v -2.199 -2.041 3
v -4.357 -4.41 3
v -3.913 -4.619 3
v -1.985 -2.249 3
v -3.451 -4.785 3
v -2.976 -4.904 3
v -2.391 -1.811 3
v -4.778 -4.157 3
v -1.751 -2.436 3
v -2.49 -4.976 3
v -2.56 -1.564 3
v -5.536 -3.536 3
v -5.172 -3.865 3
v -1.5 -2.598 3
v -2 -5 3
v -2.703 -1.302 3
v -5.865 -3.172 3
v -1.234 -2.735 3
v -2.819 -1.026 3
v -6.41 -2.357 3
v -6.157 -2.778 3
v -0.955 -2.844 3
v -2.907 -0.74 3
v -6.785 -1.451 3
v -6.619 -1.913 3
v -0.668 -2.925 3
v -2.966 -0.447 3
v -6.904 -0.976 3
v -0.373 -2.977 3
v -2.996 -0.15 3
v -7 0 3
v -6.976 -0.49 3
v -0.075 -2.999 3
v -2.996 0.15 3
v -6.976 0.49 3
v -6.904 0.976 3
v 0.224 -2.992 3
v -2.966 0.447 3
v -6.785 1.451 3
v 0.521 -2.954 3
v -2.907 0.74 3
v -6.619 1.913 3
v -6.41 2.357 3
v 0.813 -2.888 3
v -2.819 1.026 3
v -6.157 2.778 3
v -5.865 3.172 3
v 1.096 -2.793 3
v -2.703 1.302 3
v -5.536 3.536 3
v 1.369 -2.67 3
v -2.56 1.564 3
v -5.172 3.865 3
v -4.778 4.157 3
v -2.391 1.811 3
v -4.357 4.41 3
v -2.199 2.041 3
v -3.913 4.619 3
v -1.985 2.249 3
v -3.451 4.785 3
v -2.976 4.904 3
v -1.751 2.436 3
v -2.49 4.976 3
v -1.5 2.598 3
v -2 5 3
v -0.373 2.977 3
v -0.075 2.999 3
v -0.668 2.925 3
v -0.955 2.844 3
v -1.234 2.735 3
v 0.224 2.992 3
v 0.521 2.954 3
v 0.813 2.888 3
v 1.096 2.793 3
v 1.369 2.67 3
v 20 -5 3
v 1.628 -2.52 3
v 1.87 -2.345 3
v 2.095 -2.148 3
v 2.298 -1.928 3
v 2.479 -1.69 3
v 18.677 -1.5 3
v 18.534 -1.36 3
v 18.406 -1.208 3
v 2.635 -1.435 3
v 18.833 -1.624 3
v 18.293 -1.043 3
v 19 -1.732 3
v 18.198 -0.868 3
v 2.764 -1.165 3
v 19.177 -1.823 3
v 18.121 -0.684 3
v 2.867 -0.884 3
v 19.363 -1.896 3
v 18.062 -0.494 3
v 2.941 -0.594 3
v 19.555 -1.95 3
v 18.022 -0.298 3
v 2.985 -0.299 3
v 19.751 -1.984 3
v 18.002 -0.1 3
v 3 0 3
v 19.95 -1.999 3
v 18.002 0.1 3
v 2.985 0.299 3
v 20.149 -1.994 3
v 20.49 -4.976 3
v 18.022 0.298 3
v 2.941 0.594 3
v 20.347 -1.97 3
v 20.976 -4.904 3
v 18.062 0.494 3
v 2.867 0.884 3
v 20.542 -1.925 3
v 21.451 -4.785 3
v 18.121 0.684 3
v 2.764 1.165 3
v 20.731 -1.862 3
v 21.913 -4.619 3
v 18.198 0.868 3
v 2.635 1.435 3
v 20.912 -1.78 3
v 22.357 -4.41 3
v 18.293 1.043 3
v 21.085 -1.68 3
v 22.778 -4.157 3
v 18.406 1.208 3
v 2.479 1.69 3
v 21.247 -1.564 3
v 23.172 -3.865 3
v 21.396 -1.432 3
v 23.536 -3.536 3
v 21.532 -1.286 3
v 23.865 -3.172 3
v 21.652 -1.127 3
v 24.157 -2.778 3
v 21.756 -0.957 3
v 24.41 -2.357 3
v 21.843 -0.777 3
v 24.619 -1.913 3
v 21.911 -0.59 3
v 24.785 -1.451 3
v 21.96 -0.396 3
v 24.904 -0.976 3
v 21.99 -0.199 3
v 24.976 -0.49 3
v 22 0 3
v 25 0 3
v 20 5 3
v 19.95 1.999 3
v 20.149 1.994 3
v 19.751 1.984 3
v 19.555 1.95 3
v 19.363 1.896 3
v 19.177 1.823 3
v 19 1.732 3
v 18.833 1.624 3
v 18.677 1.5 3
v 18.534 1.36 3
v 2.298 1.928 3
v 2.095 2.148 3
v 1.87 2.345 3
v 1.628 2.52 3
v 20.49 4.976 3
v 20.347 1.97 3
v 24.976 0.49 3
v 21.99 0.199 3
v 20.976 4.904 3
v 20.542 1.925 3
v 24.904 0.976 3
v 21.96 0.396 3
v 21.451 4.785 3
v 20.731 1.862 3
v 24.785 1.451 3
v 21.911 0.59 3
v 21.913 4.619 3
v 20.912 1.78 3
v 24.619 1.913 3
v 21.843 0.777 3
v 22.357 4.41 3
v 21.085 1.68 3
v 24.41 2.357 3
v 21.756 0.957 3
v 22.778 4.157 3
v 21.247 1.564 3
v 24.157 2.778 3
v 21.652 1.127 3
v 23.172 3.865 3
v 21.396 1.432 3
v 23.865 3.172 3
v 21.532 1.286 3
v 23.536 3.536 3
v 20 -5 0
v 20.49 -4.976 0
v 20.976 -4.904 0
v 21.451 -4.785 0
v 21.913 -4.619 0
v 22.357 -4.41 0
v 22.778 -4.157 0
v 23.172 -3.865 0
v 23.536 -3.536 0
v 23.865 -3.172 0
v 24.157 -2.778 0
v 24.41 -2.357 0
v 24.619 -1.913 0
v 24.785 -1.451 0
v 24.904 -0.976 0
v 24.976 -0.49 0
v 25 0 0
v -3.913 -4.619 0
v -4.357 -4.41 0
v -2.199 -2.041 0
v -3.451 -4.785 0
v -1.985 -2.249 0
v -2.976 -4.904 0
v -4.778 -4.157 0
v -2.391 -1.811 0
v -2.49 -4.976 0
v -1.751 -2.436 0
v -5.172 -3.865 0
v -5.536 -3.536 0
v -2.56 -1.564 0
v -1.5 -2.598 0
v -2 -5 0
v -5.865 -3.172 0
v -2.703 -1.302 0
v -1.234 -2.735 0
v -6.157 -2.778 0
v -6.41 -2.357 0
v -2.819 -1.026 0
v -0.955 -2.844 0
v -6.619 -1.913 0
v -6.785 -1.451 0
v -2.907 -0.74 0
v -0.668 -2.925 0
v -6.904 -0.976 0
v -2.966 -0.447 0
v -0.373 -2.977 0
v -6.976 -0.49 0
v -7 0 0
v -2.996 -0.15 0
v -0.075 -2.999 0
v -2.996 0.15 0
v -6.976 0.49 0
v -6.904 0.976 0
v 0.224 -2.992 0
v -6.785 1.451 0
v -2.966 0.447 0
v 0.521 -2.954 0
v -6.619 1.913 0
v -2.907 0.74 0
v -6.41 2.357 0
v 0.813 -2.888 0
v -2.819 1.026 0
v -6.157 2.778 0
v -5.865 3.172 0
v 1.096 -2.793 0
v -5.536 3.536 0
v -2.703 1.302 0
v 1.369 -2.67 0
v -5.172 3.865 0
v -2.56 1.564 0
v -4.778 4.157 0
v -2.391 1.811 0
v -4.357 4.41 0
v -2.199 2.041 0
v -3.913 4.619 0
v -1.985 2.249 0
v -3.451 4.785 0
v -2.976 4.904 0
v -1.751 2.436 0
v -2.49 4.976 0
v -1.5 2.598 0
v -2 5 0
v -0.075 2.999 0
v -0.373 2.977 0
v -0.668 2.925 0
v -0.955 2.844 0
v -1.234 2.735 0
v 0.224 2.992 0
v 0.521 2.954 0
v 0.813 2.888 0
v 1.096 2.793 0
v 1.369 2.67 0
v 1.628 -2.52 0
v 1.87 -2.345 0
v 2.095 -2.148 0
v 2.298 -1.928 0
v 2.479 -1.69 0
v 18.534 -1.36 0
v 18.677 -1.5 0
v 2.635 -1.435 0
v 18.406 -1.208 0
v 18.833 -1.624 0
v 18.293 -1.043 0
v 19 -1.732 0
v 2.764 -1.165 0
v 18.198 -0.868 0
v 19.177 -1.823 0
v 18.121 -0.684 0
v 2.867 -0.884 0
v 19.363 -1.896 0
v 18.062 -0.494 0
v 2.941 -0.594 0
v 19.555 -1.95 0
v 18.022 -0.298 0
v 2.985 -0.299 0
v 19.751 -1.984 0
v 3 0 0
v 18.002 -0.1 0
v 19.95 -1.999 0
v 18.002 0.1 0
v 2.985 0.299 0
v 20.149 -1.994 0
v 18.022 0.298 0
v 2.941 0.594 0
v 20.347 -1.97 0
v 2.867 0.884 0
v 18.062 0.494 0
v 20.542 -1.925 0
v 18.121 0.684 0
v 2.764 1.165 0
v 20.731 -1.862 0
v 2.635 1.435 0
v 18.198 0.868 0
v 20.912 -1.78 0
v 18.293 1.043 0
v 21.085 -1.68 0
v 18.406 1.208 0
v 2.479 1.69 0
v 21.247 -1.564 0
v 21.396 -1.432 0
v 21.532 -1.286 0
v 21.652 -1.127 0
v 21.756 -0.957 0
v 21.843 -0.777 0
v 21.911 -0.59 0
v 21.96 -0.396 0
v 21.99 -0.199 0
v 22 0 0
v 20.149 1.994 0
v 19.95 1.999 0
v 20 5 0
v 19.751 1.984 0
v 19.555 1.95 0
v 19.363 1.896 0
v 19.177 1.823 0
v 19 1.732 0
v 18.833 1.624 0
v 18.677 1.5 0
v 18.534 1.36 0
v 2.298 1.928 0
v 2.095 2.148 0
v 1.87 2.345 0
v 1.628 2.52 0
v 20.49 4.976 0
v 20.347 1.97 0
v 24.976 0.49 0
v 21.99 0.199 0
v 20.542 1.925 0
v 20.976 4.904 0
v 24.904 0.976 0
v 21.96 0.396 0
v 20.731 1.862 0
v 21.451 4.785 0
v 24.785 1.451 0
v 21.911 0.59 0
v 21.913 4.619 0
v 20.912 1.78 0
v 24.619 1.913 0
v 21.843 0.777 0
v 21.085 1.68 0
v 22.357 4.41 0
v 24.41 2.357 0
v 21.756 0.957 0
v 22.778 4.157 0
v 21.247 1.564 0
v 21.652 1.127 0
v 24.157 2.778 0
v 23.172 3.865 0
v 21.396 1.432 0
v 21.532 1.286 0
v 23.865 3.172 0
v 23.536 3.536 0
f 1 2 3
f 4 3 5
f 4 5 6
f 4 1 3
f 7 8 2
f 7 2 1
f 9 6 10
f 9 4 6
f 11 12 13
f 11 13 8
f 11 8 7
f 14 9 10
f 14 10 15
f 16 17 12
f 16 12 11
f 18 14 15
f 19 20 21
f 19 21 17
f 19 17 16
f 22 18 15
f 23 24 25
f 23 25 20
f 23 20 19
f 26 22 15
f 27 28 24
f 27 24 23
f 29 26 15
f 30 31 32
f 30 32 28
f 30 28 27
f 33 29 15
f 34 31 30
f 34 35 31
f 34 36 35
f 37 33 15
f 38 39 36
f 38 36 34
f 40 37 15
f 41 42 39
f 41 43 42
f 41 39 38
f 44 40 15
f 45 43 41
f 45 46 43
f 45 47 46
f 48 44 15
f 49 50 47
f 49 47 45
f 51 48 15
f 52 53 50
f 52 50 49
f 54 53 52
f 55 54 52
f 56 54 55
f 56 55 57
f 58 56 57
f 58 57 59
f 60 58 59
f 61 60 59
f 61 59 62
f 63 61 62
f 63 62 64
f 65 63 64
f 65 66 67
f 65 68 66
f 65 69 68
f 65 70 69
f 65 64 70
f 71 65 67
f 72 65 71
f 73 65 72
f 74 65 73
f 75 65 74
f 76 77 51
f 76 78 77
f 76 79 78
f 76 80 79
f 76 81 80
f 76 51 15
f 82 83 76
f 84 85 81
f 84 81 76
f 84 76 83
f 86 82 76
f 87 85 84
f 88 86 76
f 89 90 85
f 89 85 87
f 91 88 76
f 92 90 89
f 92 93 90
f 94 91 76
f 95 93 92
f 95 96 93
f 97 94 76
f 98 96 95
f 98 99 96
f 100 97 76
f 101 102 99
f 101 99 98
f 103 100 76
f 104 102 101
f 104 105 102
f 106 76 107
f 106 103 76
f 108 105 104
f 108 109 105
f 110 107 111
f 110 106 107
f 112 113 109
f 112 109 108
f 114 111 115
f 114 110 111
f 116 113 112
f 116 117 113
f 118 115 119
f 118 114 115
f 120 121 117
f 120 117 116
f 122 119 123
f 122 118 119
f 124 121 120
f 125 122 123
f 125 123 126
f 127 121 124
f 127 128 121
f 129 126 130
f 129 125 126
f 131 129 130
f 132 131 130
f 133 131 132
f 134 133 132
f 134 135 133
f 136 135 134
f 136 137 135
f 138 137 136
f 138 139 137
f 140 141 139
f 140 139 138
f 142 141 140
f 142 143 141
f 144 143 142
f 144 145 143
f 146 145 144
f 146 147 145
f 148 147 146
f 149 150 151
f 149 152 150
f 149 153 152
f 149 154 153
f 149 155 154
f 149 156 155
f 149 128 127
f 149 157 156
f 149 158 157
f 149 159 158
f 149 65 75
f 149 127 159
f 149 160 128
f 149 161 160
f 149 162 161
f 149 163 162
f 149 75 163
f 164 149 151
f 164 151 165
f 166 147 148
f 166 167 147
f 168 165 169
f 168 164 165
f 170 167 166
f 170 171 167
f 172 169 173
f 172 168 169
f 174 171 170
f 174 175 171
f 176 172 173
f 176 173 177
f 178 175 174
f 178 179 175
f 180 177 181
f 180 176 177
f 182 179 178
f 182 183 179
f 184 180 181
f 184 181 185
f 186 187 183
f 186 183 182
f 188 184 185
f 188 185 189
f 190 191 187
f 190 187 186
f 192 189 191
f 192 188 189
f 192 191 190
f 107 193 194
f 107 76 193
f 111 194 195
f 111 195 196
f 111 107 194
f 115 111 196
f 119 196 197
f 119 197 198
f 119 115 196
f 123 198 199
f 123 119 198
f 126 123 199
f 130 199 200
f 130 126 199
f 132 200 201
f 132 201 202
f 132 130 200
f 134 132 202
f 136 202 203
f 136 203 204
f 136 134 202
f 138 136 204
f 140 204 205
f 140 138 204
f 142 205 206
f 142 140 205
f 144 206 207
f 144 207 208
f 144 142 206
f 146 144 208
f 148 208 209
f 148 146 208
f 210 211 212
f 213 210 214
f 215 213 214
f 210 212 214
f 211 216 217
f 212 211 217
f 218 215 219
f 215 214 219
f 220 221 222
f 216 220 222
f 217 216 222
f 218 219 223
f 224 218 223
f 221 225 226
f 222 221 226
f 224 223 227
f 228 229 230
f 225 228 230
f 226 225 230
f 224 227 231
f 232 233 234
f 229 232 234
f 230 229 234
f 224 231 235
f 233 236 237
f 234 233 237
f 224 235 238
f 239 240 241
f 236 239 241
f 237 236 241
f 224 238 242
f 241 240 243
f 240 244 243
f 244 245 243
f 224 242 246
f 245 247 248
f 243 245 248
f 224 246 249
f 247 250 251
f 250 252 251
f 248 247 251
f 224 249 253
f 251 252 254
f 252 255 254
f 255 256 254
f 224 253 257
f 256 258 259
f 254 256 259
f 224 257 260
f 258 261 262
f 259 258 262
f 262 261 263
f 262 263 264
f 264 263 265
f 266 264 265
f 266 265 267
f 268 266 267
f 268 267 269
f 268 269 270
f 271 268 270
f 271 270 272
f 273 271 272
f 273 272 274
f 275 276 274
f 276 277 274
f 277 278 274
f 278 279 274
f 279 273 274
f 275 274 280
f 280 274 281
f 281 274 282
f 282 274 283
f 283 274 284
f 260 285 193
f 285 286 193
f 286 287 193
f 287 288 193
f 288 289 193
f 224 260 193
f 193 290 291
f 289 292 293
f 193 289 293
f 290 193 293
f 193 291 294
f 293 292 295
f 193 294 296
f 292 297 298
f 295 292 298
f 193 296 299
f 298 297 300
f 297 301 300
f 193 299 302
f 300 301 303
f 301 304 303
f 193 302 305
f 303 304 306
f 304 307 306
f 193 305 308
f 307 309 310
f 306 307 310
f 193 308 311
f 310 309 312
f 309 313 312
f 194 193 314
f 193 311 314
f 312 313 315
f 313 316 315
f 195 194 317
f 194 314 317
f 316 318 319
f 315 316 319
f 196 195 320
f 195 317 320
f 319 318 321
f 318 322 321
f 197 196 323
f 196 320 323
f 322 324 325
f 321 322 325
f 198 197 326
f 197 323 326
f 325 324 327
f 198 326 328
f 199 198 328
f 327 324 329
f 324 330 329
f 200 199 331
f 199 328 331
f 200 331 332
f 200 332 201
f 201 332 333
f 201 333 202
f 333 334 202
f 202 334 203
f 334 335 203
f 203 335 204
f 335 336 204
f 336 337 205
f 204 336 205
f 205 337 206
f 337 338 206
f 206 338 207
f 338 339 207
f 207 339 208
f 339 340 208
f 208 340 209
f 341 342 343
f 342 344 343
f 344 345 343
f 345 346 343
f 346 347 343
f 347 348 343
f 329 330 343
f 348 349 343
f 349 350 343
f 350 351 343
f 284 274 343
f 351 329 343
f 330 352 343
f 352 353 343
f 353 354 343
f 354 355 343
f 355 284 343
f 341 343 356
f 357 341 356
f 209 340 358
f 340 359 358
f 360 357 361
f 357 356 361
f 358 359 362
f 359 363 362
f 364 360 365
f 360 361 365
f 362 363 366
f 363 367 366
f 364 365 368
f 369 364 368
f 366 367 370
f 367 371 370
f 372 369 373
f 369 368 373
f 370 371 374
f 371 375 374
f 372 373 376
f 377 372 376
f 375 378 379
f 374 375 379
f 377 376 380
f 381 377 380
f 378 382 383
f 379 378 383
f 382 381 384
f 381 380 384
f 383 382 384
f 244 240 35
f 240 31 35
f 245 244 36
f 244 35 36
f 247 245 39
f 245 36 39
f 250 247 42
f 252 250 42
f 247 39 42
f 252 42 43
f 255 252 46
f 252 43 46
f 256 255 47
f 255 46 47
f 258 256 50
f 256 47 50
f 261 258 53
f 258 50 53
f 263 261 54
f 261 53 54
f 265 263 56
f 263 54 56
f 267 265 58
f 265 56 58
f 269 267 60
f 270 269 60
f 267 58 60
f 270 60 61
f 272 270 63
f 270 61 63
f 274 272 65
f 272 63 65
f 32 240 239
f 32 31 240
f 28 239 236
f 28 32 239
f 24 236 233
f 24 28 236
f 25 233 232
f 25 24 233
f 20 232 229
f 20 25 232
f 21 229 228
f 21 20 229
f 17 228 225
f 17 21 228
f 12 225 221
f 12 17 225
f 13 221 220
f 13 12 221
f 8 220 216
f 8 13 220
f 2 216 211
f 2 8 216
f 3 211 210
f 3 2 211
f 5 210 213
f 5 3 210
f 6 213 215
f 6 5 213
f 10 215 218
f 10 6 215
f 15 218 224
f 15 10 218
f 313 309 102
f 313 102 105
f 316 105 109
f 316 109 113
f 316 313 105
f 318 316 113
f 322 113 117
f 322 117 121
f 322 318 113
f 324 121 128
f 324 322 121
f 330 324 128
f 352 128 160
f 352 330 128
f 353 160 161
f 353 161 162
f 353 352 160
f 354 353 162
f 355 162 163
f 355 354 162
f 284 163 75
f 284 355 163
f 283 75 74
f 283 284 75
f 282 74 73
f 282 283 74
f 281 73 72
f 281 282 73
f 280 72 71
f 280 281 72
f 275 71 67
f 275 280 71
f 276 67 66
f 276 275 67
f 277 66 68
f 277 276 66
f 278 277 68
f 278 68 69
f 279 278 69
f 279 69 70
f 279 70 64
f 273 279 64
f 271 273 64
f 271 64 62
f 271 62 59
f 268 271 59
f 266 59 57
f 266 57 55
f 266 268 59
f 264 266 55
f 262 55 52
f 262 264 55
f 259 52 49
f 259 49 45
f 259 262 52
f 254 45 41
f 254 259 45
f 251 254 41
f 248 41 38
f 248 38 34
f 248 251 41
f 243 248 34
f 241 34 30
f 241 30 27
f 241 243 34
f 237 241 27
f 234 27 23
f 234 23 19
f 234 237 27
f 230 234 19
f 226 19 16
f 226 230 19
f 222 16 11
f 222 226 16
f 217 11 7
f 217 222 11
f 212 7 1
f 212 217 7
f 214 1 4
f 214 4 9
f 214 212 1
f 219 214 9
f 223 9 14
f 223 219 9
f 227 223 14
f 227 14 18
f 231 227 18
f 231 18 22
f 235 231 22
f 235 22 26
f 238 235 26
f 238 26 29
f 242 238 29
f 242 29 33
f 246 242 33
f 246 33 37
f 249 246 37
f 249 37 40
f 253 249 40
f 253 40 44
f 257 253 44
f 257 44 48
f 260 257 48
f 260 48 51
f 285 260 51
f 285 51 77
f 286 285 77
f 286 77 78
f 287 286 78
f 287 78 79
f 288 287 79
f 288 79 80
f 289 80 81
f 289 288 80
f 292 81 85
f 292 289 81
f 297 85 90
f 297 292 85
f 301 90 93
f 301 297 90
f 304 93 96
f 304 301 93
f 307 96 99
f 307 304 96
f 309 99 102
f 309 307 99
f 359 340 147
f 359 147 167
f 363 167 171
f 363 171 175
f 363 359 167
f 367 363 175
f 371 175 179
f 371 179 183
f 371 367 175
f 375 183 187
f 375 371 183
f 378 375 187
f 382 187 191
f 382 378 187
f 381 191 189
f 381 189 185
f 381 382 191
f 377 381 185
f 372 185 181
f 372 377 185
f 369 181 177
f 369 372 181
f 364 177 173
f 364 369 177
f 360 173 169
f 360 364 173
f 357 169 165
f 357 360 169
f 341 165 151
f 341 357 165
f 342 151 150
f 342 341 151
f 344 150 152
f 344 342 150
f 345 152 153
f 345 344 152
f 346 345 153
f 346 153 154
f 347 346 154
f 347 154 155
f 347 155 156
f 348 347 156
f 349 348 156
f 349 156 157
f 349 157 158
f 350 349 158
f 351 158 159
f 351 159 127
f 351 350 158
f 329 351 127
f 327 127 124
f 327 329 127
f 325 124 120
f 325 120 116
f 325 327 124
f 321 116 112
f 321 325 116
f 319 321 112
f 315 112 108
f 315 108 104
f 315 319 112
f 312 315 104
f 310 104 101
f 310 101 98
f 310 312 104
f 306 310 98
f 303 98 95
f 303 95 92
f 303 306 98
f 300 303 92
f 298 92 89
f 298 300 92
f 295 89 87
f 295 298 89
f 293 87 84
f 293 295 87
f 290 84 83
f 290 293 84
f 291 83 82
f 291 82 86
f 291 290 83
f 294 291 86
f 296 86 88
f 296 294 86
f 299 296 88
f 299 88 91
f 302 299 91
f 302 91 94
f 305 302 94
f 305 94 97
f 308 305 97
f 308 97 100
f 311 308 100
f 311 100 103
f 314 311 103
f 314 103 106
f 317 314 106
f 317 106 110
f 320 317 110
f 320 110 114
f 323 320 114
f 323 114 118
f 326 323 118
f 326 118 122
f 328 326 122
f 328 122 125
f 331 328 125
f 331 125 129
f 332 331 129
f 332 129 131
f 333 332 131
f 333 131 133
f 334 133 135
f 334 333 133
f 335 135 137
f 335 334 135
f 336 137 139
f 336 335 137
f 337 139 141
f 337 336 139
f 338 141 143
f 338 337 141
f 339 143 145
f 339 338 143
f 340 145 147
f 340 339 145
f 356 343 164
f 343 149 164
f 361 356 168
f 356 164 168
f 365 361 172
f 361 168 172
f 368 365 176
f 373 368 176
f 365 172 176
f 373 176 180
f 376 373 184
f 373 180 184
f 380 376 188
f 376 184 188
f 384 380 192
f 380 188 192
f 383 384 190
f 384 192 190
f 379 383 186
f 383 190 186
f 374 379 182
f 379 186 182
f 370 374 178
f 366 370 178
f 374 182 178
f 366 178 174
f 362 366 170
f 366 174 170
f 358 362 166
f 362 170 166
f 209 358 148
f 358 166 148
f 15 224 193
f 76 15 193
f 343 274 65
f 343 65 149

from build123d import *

# Parameters (mm, degrees)
SKETCH_1_W      = 32
SKETCH_1_H      = 10
SKETCH_1_R      = 3
SKETCH_1_R_2    = 2
EXTRUDE_1_DEPTH = 3
FILLET_1_R      = 5


with BuildPart() as part:
    # 草图1 → 凸台-拉伸1 (new body)
    with BuildSketch(Plane.XY):
        with Locations((9, 0)):
            Rectangle(SKETCH_1_W, SKETCH_1_H)
        Circle(SKETCH_1_R, mode=Mode.SUBTRACT)
        with Locations((20, 0)):
            Circle(SKETCH_1_R_2, mode=Mode.SUBTRACT)
    extrude(amount=EXTRUDE_1_DEPTH)

    # 圆角1
    fillet_1_edges = [part.edges().sort_by_distance(p)[0] for p in [
        (25, -5, 1.5),
        (25, 5, 1.5),
        (-7, -5, 1.5),
        (-7, 5, 1.5),
    ]]
    fillet(fillet_1_edges, radius=FILLET_1_R - 0.0001)  # a hair under: the kernel refuses the full size


solid = part.part
